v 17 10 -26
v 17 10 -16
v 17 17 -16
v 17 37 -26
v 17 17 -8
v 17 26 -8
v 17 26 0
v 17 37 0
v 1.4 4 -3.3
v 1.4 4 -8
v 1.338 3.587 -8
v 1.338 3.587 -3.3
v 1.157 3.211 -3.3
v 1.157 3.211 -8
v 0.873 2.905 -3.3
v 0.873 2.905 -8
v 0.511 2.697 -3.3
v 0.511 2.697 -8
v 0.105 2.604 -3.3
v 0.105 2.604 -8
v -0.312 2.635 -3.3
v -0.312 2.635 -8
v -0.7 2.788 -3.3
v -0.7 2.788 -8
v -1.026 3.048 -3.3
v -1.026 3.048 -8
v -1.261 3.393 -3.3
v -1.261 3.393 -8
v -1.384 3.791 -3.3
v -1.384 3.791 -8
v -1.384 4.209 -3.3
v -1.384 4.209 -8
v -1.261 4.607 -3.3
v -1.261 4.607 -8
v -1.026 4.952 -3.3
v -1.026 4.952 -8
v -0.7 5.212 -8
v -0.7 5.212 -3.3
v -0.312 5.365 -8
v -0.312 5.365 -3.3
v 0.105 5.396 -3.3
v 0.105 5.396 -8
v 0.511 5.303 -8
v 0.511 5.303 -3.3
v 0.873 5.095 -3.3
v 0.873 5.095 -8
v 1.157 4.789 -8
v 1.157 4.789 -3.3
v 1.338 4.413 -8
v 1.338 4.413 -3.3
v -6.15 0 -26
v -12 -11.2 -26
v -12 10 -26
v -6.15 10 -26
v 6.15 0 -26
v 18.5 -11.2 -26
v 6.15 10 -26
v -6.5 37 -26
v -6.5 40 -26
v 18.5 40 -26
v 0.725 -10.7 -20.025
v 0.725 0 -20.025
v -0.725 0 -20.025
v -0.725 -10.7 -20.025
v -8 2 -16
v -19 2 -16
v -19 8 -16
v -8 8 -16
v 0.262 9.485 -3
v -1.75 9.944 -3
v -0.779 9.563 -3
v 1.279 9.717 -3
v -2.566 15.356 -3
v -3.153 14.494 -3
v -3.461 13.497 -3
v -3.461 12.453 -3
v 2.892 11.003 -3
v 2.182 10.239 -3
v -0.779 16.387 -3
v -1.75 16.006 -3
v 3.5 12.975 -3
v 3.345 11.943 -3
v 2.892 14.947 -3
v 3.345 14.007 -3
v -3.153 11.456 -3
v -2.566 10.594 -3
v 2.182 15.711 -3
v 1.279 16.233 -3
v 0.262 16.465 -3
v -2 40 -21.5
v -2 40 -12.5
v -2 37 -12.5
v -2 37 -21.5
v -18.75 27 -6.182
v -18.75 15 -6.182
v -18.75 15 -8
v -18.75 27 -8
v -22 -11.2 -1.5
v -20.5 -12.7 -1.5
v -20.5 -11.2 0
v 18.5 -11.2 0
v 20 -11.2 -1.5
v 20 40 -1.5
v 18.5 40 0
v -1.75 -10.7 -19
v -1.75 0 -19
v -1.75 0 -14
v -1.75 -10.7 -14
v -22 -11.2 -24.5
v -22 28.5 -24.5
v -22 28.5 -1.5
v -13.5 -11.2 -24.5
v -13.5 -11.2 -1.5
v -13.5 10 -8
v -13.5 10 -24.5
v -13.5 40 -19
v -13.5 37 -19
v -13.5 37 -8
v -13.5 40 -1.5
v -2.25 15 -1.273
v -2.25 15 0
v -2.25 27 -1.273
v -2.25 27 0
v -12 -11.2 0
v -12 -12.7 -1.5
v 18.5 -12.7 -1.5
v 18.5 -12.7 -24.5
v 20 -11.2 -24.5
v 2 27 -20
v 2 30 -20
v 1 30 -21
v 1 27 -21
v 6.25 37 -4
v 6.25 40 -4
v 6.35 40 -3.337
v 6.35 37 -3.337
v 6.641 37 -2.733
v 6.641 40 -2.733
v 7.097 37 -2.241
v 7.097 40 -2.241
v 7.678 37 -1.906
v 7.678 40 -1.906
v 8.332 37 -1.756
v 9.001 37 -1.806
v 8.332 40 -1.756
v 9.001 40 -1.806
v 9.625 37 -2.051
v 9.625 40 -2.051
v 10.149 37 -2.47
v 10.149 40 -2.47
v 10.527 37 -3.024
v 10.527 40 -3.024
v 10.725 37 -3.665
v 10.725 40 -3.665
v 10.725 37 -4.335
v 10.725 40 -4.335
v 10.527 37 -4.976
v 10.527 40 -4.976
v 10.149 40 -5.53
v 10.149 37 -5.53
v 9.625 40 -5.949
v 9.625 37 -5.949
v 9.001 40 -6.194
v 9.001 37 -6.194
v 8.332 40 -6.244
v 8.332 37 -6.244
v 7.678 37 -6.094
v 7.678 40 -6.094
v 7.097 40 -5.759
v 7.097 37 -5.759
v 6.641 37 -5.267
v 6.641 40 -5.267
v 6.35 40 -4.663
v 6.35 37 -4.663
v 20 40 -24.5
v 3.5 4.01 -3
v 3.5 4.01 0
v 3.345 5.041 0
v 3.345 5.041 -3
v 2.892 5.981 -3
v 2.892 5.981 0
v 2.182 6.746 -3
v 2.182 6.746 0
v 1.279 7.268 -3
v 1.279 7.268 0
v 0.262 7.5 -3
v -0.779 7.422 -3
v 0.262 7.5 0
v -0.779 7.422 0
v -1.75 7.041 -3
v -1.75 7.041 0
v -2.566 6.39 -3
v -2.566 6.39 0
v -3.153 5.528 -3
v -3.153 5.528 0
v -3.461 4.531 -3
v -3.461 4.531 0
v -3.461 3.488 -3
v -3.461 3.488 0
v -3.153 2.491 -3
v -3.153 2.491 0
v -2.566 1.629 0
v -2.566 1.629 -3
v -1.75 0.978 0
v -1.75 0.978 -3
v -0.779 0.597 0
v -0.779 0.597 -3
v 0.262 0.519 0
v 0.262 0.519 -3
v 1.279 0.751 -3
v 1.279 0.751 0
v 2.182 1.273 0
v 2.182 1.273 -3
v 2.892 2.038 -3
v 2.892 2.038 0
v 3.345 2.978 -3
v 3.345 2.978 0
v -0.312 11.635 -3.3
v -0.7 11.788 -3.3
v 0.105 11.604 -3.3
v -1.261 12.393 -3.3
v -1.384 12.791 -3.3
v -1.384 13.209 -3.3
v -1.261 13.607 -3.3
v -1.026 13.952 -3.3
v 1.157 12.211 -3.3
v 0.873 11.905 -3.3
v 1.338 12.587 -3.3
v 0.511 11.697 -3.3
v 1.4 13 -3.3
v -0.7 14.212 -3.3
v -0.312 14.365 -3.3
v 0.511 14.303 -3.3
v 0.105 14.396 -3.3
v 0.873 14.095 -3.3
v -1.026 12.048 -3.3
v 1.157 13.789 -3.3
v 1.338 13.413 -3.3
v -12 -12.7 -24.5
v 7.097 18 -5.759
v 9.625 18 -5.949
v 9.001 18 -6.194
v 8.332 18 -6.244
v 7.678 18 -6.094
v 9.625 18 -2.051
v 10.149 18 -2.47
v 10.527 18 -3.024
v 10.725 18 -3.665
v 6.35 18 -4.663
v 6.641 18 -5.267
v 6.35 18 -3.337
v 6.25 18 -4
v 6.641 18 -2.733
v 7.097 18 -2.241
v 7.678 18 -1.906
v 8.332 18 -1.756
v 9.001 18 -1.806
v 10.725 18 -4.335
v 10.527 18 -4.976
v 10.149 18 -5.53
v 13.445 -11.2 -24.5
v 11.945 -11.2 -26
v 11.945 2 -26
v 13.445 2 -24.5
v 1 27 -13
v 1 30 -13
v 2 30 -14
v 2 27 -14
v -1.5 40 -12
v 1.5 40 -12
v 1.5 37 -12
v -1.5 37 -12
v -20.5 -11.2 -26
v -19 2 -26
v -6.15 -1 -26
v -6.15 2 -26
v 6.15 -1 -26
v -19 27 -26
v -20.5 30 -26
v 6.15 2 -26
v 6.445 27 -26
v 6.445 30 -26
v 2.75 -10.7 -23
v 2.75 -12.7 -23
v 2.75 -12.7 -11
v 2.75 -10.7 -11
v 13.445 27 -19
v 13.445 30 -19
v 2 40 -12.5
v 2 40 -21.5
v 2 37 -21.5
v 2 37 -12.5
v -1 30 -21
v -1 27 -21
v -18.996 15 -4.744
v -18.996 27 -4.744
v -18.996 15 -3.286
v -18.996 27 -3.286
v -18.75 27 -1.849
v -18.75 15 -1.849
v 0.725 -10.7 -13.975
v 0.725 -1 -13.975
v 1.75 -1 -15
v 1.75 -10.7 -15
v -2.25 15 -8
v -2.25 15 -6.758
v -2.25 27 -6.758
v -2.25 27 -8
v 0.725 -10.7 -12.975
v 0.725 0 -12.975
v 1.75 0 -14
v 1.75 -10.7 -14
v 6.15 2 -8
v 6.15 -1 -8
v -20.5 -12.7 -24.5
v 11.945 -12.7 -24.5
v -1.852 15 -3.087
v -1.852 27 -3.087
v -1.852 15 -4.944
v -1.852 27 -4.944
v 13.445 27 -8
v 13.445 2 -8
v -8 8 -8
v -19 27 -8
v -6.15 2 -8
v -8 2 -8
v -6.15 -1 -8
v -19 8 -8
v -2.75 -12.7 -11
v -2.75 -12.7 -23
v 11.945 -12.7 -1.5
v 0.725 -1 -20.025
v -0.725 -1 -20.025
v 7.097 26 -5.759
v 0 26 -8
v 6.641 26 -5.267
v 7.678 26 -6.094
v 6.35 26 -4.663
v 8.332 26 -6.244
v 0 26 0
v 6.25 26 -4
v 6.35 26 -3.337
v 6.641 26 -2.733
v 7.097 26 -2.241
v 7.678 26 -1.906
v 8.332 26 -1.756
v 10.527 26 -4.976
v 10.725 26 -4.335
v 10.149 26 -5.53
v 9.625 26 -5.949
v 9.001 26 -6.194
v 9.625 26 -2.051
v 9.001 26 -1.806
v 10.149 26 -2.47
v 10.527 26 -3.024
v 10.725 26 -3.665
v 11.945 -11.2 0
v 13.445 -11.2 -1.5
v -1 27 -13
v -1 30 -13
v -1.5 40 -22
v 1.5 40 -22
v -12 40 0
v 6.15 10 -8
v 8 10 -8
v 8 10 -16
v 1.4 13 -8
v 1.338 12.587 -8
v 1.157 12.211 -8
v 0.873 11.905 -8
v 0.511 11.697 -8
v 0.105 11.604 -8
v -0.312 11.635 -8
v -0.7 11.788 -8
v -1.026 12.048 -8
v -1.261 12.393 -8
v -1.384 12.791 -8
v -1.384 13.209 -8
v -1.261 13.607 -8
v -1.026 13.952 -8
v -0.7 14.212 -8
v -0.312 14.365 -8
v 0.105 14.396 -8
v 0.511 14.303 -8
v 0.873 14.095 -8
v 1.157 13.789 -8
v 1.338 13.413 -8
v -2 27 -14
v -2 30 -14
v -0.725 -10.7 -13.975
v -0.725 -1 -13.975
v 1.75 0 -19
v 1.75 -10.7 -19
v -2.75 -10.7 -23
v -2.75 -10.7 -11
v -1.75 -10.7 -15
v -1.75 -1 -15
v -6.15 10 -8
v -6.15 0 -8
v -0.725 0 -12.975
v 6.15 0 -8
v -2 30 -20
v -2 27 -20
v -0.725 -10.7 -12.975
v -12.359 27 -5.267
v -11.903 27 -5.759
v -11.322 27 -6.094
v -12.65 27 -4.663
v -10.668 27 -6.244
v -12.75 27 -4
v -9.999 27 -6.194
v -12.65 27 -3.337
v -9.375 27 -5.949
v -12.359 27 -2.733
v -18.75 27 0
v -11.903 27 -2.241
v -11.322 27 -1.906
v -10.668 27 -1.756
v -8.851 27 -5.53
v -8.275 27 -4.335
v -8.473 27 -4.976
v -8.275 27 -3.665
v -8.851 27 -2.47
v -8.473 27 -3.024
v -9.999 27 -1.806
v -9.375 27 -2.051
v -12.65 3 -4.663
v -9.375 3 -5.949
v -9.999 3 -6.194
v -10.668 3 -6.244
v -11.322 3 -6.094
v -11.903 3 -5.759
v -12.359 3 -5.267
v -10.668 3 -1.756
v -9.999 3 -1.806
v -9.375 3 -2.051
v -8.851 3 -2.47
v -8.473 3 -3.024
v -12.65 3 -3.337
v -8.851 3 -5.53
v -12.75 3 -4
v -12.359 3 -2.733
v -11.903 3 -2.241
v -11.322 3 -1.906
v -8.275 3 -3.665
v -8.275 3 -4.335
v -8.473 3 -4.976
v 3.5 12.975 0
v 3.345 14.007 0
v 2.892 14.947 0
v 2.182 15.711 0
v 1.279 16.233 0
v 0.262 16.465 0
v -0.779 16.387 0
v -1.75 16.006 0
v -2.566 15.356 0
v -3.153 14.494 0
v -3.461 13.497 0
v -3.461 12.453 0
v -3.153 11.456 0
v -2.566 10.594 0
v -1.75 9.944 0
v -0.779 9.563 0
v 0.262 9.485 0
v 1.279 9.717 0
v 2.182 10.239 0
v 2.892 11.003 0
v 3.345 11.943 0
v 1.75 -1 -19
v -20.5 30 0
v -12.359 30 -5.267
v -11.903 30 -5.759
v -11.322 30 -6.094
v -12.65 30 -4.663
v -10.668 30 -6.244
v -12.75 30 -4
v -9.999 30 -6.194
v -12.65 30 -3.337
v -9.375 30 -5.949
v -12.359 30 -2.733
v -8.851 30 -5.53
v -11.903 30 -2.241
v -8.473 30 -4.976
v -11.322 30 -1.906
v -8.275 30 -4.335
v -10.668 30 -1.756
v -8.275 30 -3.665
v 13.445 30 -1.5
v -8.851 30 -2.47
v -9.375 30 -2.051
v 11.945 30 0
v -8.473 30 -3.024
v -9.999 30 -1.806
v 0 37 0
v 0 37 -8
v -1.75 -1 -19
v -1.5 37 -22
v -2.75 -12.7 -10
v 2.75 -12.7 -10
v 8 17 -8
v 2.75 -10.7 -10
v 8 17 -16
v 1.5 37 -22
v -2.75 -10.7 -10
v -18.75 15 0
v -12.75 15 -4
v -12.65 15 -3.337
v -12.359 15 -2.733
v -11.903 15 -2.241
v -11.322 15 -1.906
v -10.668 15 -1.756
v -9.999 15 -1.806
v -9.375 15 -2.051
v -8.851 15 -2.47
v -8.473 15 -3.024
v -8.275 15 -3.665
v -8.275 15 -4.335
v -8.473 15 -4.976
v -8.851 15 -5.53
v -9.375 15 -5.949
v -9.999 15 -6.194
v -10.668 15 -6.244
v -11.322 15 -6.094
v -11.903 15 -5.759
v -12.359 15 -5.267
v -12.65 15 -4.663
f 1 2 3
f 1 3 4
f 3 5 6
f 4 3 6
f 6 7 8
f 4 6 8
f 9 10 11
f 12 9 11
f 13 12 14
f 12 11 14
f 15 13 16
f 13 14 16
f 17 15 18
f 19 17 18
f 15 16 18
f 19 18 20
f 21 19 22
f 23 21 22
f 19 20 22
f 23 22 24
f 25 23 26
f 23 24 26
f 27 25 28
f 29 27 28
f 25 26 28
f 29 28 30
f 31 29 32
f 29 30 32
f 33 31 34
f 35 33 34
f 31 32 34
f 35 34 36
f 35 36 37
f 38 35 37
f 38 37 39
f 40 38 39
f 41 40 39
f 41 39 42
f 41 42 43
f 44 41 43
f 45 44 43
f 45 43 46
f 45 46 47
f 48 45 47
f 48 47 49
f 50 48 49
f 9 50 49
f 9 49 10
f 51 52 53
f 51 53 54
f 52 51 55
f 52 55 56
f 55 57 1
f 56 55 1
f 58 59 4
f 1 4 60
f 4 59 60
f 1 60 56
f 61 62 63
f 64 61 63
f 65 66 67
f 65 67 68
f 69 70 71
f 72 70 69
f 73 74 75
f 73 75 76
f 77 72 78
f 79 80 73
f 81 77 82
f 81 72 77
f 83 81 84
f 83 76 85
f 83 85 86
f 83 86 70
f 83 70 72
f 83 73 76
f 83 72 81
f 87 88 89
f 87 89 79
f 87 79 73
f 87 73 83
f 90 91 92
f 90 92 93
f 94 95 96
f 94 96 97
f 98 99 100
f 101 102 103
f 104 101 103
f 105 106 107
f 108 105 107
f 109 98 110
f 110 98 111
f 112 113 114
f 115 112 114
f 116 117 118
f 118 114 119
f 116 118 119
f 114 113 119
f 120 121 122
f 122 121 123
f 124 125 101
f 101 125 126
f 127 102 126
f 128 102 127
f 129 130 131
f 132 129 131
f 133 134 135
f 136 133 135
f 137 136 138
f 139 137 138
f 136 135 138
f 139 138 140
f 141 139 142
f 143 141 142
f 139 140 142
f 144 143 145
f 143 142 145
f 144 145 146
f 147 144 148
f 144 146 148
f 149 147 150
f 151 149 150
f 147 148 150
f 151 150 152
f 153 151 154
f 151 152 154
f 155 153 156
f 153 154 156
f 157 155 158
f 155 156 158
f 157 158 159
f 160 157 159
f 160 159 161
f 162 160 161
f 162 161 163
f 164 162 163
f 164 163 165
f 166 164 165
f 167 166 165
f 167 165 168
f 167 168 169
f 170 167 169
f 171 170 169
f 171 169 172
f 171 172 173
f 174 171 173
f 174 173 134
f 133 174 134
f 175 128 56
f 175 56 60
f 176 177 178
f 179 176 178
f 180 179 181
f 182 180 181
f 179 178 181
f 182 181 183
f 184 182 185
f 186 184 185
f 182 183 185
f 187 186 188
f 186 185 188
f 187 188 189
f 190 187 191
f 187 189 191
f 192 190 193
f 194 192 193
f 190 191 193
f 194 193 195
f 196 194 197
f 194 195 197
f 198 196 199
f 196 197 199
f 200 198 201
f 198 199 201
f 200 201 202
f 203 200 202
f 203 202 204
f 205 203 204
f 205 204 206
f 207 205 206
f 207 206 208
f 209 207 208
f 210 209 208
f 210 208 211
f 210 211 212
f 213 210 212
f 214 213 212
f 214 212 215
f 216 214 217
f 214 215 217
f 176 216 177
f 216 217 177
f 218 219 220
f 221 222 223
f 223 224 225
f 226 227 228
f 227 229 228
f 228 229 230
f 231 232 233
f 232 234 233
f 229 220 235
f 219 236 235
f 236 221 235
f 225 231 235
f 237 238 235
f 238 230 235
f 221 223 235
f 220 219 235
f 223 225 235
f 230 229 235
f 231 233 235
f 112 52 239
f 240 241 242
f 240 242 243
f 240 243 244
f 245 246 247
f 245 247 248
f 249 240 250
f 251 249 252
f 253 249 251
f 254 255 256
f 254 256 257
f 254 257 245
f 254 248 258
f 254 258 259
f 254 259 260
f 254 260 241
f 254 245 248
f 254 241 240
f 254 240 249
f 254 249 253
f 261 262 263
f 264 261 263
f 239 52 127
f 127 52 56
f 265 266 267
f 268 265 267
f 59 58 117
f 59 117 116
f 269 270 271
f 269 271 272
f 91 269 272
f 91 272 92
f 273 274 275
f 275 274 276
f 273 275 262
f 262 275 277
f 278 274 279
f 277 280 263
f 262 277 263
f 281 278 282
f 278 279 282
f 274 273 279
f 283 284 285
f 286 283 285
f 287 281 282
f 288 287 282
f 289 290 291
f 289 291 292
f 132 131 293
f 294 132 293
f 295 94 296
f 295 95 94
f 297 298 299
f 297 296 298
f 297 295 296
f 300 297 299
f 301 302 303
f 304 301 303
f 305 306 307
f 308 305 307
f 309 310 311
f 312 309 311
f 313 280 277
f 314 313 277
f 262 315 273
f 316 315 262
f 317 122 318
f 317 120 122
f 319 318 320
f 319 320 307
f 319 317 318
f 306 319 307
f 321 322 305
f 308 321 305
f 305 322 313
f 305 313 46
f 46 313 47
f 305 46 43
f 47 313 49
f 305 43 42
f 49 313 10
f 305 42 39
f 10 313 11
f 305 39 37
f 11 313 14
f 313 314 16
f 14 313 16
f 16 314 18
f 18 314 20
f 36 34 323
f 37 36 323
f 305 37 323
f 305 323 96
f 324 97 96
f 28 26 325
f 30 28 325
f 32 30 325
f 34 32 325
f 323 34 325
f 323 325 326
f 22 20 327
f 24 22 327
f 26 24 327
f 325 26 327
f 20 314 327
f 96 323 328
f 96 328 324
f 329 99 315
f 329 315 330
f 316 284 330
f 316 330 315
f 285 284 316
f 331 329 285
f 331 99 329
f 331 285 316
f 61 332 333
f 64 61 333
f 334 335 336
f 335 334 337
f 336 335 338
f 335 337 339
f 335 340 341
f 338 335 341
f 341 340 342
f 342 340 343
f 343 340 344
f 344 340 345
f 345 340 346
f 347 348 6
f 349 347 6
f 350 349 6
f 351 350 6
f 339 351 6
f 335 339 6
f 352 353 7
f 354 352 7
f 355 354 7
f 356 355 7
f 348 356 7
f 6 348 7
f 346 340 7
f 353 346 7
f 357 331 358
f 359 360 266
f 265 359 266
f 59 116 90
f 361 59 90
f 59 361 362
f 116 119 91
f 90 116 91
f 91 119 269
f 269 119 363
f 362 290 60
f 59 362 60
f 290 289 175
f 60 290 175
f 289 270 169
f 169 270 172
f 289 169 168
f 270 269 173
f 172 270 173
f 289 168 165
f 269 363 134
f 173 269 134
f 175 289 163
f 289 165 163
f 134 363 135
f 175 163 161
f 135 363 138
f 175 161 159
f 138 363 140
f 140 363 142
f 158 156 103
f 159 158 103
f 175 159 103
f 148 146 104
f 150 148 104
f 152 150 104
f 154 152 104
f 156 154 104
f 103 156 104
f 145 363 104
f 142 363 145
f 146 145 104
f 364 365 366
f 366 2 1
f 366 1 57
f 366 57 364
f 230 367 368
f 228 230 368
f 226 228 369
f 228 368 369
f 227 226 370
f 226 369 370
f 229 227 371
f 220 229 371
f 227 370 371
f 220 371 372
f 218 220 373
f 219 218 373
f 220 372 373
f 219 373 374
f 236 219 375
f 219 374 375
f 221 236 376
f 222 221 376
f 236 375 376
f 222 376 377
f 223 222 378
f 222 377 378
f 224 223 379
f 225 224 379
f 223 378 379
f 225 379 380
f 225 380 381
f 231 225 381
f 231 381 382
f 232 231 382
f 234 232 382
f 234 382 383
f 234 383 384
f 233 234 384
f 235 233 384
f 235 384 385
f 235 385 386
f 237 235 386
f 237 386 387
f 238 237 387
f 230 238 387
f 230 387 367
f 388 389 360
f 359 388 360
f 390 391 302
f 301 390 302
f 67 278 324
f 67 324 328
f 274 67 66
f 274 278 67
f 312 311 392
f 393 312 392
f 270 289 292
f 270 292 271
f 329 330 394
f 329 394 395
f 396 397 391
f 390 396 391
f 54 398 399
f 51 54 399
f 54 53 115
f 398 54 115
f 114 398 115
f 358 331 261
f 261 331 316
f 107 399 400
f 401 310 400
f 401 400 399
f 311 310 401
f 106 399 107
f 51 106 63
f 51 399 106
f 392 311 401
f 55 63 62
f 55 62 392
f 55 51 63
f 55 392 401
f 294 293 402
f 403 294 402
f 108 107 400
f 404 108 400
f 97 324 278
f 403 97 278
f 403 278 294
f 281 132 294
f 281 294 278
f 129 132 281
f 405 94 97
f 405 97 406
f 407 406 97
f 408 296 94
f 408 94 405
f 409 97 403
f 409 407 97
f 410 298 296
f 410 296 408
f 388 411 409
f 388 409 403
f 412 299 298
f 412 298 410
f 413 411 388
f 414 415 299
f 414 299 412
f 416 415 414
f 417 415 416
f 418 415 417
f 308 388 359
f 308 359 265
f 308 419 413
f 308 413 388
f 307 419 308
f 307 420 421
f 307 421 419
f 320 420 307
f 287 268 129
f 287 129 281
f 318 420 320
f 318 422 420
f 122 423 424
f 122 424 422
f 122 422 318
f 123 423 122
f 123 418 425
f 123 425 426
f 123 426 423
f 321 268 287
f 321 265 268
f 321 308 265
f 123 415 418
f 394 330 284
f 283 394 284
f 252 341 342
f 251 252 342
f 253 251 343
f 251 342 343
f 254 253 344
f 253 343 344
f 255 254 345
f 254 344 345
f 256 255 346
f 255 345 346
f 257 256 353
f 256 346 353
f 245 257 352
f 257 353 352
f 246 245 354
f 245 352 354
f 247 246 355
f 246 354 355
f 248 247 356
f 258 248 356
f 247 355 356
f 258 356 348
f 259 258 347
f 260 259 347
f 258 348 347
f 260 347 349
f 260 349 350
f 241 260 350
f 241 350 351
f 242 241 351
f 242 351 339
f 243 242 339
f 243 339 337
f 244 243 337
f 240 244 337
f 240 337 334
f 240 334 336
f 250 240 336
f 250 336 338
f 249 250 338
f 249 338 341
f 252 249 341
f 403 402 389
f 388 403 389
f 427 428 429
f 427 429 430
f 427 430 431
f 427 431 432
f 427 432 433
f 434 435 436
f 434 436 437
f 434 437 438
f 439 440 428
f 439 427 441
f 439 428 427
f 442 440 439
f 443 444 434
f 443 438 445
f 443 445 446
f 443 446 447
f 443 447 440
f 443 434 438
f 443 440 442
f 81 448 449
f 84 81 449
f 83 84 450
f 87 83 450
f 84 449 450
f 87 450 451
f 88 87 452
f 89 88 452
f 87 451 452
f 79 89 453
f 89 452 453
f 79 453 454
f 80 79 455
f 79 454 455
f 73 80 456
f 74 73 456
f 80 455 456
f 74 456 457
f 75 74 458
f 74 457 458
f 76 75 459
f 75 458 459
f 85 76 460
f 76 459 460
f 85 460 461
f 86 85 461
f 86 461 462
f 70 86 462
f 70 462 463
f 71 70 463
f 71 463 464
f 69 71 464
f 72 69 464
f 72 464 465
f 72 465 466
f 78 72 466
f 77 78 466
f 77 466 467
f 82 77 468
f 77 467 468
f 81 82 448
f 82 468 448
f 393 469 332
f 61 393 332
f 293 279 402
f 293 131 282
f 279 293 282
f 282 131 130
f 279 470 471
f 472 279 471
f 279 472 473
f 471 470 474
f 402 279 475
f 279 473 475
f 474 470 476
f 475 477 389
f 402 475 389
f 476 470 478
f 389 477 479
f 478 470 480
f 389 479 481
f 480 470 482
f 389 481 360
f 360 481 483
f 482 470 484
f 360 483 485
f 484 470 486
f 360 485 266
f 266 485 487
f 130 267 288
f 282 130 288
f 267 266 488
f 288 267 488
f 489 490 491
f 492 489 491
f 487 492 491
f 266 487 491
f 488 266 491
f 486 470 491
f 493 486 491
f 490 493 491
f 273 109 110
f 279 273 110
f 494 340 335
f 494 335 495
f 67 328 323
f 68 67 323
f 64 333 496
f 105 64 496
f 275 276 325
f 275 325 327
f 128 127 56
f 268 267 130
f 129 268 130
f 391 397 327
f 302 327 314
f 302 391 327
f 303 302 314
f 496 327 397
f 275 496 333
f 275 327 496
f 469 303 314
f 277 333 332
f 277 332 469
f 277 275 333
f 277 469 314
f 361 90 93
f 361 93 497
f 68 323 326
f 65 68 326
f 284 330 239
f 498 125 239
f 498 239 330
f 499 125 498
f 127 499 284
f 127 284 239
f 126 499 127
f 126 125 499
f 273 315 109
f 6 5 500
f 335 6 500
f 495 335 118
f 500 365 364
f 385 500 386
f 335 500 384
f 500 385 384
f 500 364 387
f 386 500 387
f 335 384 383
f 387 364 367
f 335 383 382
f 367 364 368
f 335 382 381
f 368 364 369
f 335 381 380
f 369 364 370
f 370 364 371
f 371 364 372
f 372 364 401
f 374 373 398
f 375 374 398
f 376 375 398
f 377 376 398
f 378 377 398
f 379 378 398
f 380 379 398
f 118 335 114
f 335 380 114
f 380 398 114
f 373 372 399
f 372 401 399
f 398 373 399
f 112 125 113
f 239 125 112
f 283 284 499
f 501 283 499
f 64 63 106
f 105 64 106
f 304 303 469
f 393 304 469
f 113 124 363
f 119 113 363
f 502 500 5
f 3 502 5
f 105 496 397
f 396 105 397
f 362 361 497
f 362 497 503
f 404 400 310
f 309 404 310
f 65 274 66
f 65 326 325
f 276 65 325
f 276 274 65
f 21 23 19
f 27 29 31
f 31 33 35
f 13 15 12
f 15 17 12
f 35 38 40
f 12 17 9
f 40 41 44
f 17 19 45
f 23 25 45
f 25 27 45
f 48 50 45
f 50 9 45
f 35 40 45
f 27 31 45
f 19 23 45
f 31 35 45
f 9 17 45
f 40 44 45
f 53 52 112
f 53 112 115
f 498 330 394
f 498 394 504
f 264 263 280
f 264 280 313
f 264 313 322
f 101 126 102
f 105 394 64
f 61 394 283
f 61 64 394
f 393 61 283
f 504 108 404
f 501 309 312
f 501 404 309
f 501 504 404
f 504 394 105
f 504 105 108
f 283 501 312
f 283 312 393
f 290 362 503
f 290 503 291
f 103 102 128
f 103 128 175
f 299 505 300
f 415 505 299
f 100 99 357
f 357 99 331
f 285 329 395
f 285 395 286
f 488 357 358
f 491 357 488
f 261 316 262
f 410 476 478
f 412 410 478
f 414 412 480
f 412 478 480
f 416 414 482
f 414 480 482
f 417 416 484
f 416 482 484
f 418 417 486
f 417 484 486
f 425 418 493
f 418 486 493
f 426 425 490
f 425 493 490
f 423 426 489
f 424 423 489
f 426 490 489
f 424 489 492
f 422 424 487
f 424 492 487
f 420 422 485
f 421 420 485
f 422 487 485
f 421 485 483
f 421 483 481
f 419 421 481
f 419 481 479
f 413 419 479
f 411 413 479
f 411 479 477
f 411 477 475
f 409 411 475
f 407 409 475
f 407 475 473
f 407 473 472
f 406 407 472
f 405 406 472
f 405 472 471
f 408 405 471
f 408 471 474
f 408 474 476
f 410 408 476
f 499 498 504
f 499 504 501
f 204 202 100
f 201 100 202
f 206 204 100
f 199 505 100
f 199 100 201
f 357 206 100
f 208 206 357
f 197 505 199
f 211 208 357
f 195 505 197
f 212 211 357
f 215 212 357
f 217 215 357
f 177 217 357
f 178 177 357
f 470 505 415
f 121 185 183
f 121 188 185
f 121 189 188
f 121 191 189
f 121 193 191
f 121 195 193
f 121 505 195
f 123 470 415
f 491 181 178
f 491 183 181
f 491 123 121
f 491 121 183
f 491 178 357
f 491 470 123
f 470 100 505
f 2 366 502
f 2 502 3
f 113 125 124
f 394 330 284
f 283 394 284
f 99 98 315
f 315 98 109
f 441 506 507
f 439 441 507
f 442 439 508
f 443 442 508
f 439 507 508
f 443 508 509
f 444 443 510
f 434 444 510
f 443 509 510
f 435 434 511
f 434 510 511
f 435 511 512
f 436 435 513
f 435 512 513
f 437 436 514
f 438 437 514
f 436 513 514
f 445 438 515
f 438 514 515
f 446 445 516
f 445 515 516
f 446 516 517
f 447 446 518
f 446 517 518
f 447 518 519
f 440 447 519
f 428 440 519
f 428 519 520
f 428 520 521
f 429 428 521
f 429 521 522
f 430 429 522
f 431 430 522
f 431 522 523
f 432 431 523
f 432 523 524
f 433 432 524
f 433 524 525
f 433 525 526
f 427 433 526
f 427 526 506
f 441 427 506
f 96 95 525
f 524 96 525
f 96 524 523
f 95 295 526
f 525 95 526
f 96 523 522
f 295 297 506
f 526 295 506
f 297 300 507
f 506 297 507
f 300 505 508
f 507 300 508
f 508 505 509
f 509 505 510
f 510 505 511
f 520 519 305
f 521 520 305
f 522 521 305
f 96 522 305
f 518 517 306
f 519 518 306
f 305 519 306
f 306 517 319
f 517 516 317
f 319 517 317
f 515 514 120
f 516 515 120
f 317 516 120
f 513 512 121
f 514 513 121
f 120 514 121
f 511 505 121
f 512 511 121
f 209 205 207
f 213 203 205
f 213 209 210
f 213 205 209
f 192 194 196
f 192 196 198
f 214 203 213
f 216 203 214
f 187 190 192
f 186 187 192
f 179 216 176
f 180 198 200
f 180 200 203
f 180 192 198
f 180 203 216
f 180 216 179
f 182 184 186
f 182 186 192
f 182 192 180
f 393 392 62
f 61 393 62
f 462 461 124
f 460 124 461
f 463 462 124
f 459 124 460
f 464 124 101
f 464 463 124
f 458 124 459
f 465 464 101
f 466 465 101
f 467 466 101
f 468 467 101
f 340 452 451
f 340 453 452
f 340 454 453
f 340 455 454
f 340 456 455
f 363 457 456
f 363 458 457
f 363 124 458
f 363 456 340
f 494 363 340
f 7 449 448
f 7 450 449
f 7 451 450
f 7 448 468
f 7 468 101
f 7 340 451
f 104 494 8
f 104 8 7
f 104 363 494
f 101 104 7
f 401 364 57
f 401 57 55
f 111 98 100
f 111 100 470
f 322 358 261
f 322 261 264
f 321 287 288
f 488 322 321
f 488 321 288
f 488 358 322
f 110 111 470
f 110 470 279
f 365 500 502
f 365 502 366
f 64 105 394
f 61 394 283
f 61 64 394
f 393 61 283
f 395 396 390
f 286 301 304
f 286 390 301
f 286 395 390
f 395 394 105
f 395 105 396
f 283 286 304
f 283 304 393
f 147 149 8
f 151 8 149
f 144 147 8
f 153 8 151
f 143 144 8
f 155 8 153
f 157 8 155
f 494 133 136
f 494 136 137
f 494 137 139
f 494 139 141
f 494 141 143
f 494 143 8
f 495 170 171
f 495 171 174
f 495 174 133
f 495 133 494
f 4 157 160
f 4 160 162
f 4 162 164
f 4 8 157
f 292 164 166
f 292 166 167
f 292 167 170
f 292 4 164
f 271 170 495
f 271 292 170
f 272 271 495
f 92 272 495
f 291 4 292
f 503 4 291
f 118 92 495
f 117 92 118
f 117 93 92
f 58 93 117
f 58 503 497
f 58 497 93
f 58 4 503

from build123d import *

# Parameters (mm, degrees)
SKETCH001_W     = 33.5
SKETCH001_H     = 52.7
PAD_DEPTH       = 26
POCKET_DEPTH    = 18
SKETCH003_W     = 17
SKETCH003_H     = 11
POCKET001_DEPTH = 26.001
SKETCH004_W     = 12.3
SKETCH004_H     = 16
POCKET002_DEPTH = 27
POCKET012_DEPTH = 52.701
SKETCH018_W     = 5.5
SKETCH018_H     = 13
POCKET013_DEPTH = 2
POCKET014_DEPTH = 5
SKETCH006_R     = 1.4
POCKET015_DEPTH = 10.001
SKETCH005_R     = 2.25
POCKET016_DEPTH = 22
SKETCH017_W     = 10.406255
SKETCH017_H     = 8.775244
PAD003_DEPTH    = 8
CHAMFER_SIZE    = 7
CHAMFER004_SIZE = 1.5
SKETCH023_R     = 3.5
POCKET020_DEPTH = 3
SKETCH024_R     = 1.752011
PAD005_DEPTH    = 0.3
SKETCH012_W     = 35.444937
SKETCH012_H     = 42.7
PAD001_DEPTH    = 26
POCKET006_DEPTH = 18
SKETCH008_W     = 16.5
SKETCH008_H     = 12
POCKET007_DEPTH = 26.001
SKETCH010_R     = 2.25
POCKET008_DEPTH = 30
SKETCH014_W     = 12.3
SKETCH014_H     = 16
POCKET009_DEPTH = 27
SKETCH011_R     = 1.4
POCKET010_DEPTH = 10.001
POCKET011_DEPTH = 52.701
POCKET017_DEPTH = 5
SKETCH016_W     = 11.218459
SKETCH016_H     = 8
PAD004_DEPTH    = 8
SKETCH021_W     = 5.5
SKETCH021_H     = 12
POCKET018_DEPTH = 2
CHAMFER002_SIZE = 7
CHAMFER003_SIZE = 1.5
SKETCH022_R     = 8.612624
POCKET019_DEPTH = 12
SKETCH025_R     = 3.5
POCKET021_DEPTH = 3
SKETCH026_R     = 2.076853
PAD006_DEPTH    = 0.3


with BuildPart() as xtensioner:
    # Sketch001 → Pad (new body)
    with BuildSketch(Plane.XY):
        with Locations((3.25, 13.65)):
            Rectangle(SKETCH001_W, SKETCH001_H)
    extrude(amount=-PAD_DEPTH)

    # Sketch002 (on Face6 of Pad) → Pocket (cut)
    with BuildSketch(Plane(origin=(0, 0, -26), x_dir=(1, 0, 0), z_dir=(0, 0, -1))):
        Polygon((-15, -10), (15, -10), (15, -10), (17, -10), (17, -37), (-15, -37), align=None)
    extrude(amount=-POCKET_DEPTH, mode=Mode.SUBTRACT)

    # Sketch003 → Pocket001 (cut, through all)
    with BuildSketch(Plane.XY):
        with Locations((8.5, 31.5)):
            Rectangle(SKETCH003_W, SKETCH003_H)
    extrude(amount=-POCKET001_DEPTH, mode=Mode.SUBTRACT)

    # Sketch004 → Pocket002 (cut)
    with BuildSketch(Plane(origin=(0, 0, -35), x_dir=(1, 0, 0), z_dir=(0, 0, -1))):
        with Locations((0, -8)):
            Rectangle(SKETCH004_W, SKETCH004_H)
    extrude(amount=-POCKET002_DEPTH, mode=Mode.SUBTRACT)

    # Sketch007 (on Face9 of Pocket002) → Pocket012 (cut, through all)
    with BuildSketch(Plane(origin=(0, 40, 0), x_dir=(-1, 0, 0), z_dir=(0, 1, 0))):
        Polygon((-1.75, -14), (-1.75, -19), (-0.724874, -20.025126), (0.724874, -20.025126), (1.75, -19), (1.75, -14), (0.724874, -12.974874), (-0.724874, -12.974874), align=None)
    extrude(amount=-POCKET012_DEPTH, mode=Mode.SUBTRACT)

    # Sketch018 (on Face1 of Pocket012) → Pocket013 (cut)
    with BuildSketch(Plane.XZ.offset(12.7)):
        with Locations((0, -16.5)):
            Rectangle(SKETCH018_W, SKETCH018_H)
    extrude(amount=-POCKET013_DEPTH, mode=Mode.SUBTRACT)

    # Sketch019 (on Face13 of Pocket013) → Pocket014 (cut)
    with BuildSketch(Plane(origin=(0, 40, 0), x_dir=(-1, 0, 0), z_dir=(0, 1, 0))):
        Polygon((-1.5, -12), (1.5, -12), (2, -12.5), (2, -21.5), (1.5, -22), (-1.5, -22), (-2, -21.5), (-2, -12.5), align=None)
    extrude(amount=-POCKET014_DEPTH, mode=Mode.SUBTRACT)

    # Sketch006 → Pocket015 (cut, through all)
    with BuildSketch(Plane(origin=(0, 0, -10), x_dir=(1, 0, 0), z_dir=(0, 0, -1))):
        with Locations((0, -13)):
            Circle(SKETCH006_R)
    extrude(amount=-POCKET015_DEPTH, mode=Mode.SUBTRACT)

    # Sketch005 → Pocket016 (cut)
    with BuildSketch(Plane(origin=(0, 40, 0), x_dir=(-1, 0, 0), z_dir=(0, 1, 0))):
        with Locations((-8.5, -4)):
            Circle(SKETCH005_R)
    extrude(amount=-POCKET016_DEPTH, mode=Mode.SUBTRACT)

    # Sketch017 → Pad003 (join)
    with BuildSketch(Plane(origin=(0, 0, -8), x_dir=(1, 0, 0), z_dir=(0, 0, -1))):
        with Locations((13.203127, -12.612378)):
            Rectangle(SKETCH017_W, SKETCH017_H)
    extrude(amount=PAD003_DEPTH)

    # Chamfer
    chamfer_edges = [xtensioner.edges().sort_by_distance(p)[0] for p in [
        (-13.5, 38.5, -26),
    ]]
    chamfer(chamfer_edges, length=CHAMFER_SIZE)

    # Chamfer004
    chamfer004_edges = [xtensioner.edges().sort_by_distance(p)[0] for p in [
        (20, -12.7, -13),
        (3.25, -12.7, -26),
        (3.25, -12.7, 0),
        (20, 13.65, 0),
        (20, 13.65, -26),
        (-13.5, -1.35, -26),
        (-13.5, -12.7, -13),
        (-13.5, 13.65, 0),
    ]]
    chamfer(chamfer004_edges, length=CHAMFER004_SIZE)

    # Sketch023 (on Face14 of Chamfer004) → Pocket020 (cut)
    with BuildSketch(Plane.XY):
        with Locations((0, 12.97505)):
            Circle(SKETCH023_R)
    extrude(amount=-POCKET020_DEPTH, mode=Mode.SUBTRACT)

    # Sketch024 (on Face64 of Pocket020) → Pad005 (join)
    with BuildSketch(Plane.XY.offset(-3)):
        with Locations((0, 13.089694)):
            Circle(SKETCH024_R)
    extrude(amount=-PAD005_DEPTH)


with BuildPart() as y_tensioner:
    # Sketch012 → Pad001 (new body)
    with BuildSketch(Plane.XY):
        with Locations((-4.277532, 8.65)):
            Rectangle(SKETCH012_W, SKETCH012_H)
    extrude(amount=-PAD001_DEPTH)

    # Sketch013 (on Face6 of Pad001) → Pocket006 (cut)
    with BuildSketch(Plane(origin=(0, 0, -26), x_dir=(1, 0, 0), z_dir=(0, 0, -1))):
        Polygon((-19, -2), (19, -2), (19, -2), (17, -2), (17, -27), (-19, -27), align=None)
    extrude(amount=-POCKET006_DEPTH, mode=Mode.SUBTRACT)

    # Sketch008 → Pocket007 (cut, through all)
    with BuildSketch(Plane.XY):
        with Locations((-10.5, 21)):
            Rectangle(SKETCH008_W, SKETCH008_H)
    extrude(amount=-POCKET007_DEPTH, mode=Mode.SUBTRACT)

    # Sketch010 → Pocket008 (cut)
    with BuildSketch(Plane(origin=(0, 33, 0), x_dir=(-1, 0, 0), z_dir=(0, 1, 0))):
        with Locations((10.5, -4)):
            Circle(SKETCH010_R)
    extrude(amount=-POCKET008_DEPTH, mode=Mode.SUBTRACT)

    # Sketch014 → Pocket009 (cut)
    with BuildSketch(Plane(origin=(0, 0, -35), x_dir=(1, 0, 0), z_dir=(0, 0, -1))):
        with Locations((0, -7)):
            Rectangle(SKETCH014_W, SKETCH014_H)
    extrude(amount=-POCKET009_DEPTH, mode=Mode.SUBTRACT)

    # Sketch011 → Pocket010 (cut, through all)
    with BuildSketch(Plane(origin=(0, 0, -10), x_dir=(1, 0, 0), z_dir=(0, 0, -1))):
        with Locations((0, -4)):
            Circle(SKETCH011_R)
    extrude(amount=-POCKET010_DEPTH, mode=Mode.SUBTRACT)

    # Sketch015 (on Face9 of Pocket002) → Pocket011 (cut, through all)
    with BuildSketch(Plane(origin=(0, 40, 0), x_dir=(-1, 0, 0), z_dir=(0, 1, 0))):
        Polygon((-1.75, -15), (-1.75, -19), (-0.724874, -20.025126), (0.724874, -20.025126), (1.75, -19), (1.75, -15), (0.724874, -13.974874), (-0.724874, -13.974874), align=None)
    extrude(amount=-POCKET011_DEPTH, mode=Mode.SUBTRACT)

    # Sketch020 (on Face14 of Pocket011) → Pocket017 (cut)
    with BuildSketch(Plane(origin=(0, 30, 0), x_dir=(-1, 0, 0), z_dir=(0, 1, 0))):
        Polygon((-2, -14), (-2, -20), (-1, -21), (1, -21), (2, -20), (2, -14), (1, -13), (-1, -13), align=None)
    extrude(amount=-POCKET017_DEPTH, mode=Mode.SUBTRACT)

    # Sketch016 (on Face40 of Pocket017) → Pad004 (join)
    with BuildSketch(Plane(origin=(0, 0, -8), x_dir=(1, 0, 0), z_dir=(0, 0, -1))):
        with Locations((-13.609229, -4)):
            Rectangle(SKETCH016_W, SKETCH016_H)
    extrude(amount=PAD004_DEPTH)

    # Sketch021 → Pocket018 (cut)
    with BuildSketch(Plane.XZ.offset(12.7)):
        with Locations((0, -17)):
            Rectangle(SKETCH021_W, SKETCH021_H)
    extrude(amount=-POCKET018_DEPTH, mode=Mode.SUBTRACT)

    # Chamfer002
    chamfer002_edges = [y_tensioner.edges().sort_by_distance(p)[0] for p in [
        (13.444937, 28.5, -26),
    ]]
    chamfer(chamfer002_edges, length=CHAMFER002_SIZE)

    # Chamfer003
    chamfer003_edges = [y_tensioner.edges().sort_by_distance(p)[0] for p in [
        (13.444937, -12.7, -13),
        (-4.277532, -12.7, -26),
        (-4.277532, -12.7, 0),
        (-22, -12.7, -13),
        (-22, 8.65, 0),
        (13.444937, 8.65, 0),
        (13.444937, -5.35, -26),
        (-22, 8.65, -26),
        (-22, 30, -13),
    ]]
    chamfer(chamfer003_edges, length=CHAMFER003_SIZE)

    # Sketch022 (on Face54 of Chamfer003) → Pocket019 (cut)
    with BuildSketch(Plane(origin=(0, 15, 0), x_dir=(-1, 0, 0), z_dir=(0, 1, 0))):
        with Locations((10.414225, -4.015364)):
            Circle(SKETCH022_R)
    extrude(amount=POCKET019_DEPTH, mode=Mode.SUBTRACT)

    # Sketch025 (on Face18 of Pocket019) → Pocket021 (cut)
    with BuildSketch(Plane.XY):
        with Locations((0, 4.009526)):
            Circle(SKETCH025_R)
    extrude(amount=-POCKET021_DEPTH, mode=Mode.SUBTRACT)

    # Sketch026 (on Face74 of Pocket021) → Pad006 (join)
    with BuildSketch(Plane.XY.offset(-3)):
        with Locations((0, 3.872298)):
            Circle(SKETCH026_R)
    extrude(amount=-PAD006_DEPTH)


solid = Compound([xtensioner.part, y_tensioner.part])
